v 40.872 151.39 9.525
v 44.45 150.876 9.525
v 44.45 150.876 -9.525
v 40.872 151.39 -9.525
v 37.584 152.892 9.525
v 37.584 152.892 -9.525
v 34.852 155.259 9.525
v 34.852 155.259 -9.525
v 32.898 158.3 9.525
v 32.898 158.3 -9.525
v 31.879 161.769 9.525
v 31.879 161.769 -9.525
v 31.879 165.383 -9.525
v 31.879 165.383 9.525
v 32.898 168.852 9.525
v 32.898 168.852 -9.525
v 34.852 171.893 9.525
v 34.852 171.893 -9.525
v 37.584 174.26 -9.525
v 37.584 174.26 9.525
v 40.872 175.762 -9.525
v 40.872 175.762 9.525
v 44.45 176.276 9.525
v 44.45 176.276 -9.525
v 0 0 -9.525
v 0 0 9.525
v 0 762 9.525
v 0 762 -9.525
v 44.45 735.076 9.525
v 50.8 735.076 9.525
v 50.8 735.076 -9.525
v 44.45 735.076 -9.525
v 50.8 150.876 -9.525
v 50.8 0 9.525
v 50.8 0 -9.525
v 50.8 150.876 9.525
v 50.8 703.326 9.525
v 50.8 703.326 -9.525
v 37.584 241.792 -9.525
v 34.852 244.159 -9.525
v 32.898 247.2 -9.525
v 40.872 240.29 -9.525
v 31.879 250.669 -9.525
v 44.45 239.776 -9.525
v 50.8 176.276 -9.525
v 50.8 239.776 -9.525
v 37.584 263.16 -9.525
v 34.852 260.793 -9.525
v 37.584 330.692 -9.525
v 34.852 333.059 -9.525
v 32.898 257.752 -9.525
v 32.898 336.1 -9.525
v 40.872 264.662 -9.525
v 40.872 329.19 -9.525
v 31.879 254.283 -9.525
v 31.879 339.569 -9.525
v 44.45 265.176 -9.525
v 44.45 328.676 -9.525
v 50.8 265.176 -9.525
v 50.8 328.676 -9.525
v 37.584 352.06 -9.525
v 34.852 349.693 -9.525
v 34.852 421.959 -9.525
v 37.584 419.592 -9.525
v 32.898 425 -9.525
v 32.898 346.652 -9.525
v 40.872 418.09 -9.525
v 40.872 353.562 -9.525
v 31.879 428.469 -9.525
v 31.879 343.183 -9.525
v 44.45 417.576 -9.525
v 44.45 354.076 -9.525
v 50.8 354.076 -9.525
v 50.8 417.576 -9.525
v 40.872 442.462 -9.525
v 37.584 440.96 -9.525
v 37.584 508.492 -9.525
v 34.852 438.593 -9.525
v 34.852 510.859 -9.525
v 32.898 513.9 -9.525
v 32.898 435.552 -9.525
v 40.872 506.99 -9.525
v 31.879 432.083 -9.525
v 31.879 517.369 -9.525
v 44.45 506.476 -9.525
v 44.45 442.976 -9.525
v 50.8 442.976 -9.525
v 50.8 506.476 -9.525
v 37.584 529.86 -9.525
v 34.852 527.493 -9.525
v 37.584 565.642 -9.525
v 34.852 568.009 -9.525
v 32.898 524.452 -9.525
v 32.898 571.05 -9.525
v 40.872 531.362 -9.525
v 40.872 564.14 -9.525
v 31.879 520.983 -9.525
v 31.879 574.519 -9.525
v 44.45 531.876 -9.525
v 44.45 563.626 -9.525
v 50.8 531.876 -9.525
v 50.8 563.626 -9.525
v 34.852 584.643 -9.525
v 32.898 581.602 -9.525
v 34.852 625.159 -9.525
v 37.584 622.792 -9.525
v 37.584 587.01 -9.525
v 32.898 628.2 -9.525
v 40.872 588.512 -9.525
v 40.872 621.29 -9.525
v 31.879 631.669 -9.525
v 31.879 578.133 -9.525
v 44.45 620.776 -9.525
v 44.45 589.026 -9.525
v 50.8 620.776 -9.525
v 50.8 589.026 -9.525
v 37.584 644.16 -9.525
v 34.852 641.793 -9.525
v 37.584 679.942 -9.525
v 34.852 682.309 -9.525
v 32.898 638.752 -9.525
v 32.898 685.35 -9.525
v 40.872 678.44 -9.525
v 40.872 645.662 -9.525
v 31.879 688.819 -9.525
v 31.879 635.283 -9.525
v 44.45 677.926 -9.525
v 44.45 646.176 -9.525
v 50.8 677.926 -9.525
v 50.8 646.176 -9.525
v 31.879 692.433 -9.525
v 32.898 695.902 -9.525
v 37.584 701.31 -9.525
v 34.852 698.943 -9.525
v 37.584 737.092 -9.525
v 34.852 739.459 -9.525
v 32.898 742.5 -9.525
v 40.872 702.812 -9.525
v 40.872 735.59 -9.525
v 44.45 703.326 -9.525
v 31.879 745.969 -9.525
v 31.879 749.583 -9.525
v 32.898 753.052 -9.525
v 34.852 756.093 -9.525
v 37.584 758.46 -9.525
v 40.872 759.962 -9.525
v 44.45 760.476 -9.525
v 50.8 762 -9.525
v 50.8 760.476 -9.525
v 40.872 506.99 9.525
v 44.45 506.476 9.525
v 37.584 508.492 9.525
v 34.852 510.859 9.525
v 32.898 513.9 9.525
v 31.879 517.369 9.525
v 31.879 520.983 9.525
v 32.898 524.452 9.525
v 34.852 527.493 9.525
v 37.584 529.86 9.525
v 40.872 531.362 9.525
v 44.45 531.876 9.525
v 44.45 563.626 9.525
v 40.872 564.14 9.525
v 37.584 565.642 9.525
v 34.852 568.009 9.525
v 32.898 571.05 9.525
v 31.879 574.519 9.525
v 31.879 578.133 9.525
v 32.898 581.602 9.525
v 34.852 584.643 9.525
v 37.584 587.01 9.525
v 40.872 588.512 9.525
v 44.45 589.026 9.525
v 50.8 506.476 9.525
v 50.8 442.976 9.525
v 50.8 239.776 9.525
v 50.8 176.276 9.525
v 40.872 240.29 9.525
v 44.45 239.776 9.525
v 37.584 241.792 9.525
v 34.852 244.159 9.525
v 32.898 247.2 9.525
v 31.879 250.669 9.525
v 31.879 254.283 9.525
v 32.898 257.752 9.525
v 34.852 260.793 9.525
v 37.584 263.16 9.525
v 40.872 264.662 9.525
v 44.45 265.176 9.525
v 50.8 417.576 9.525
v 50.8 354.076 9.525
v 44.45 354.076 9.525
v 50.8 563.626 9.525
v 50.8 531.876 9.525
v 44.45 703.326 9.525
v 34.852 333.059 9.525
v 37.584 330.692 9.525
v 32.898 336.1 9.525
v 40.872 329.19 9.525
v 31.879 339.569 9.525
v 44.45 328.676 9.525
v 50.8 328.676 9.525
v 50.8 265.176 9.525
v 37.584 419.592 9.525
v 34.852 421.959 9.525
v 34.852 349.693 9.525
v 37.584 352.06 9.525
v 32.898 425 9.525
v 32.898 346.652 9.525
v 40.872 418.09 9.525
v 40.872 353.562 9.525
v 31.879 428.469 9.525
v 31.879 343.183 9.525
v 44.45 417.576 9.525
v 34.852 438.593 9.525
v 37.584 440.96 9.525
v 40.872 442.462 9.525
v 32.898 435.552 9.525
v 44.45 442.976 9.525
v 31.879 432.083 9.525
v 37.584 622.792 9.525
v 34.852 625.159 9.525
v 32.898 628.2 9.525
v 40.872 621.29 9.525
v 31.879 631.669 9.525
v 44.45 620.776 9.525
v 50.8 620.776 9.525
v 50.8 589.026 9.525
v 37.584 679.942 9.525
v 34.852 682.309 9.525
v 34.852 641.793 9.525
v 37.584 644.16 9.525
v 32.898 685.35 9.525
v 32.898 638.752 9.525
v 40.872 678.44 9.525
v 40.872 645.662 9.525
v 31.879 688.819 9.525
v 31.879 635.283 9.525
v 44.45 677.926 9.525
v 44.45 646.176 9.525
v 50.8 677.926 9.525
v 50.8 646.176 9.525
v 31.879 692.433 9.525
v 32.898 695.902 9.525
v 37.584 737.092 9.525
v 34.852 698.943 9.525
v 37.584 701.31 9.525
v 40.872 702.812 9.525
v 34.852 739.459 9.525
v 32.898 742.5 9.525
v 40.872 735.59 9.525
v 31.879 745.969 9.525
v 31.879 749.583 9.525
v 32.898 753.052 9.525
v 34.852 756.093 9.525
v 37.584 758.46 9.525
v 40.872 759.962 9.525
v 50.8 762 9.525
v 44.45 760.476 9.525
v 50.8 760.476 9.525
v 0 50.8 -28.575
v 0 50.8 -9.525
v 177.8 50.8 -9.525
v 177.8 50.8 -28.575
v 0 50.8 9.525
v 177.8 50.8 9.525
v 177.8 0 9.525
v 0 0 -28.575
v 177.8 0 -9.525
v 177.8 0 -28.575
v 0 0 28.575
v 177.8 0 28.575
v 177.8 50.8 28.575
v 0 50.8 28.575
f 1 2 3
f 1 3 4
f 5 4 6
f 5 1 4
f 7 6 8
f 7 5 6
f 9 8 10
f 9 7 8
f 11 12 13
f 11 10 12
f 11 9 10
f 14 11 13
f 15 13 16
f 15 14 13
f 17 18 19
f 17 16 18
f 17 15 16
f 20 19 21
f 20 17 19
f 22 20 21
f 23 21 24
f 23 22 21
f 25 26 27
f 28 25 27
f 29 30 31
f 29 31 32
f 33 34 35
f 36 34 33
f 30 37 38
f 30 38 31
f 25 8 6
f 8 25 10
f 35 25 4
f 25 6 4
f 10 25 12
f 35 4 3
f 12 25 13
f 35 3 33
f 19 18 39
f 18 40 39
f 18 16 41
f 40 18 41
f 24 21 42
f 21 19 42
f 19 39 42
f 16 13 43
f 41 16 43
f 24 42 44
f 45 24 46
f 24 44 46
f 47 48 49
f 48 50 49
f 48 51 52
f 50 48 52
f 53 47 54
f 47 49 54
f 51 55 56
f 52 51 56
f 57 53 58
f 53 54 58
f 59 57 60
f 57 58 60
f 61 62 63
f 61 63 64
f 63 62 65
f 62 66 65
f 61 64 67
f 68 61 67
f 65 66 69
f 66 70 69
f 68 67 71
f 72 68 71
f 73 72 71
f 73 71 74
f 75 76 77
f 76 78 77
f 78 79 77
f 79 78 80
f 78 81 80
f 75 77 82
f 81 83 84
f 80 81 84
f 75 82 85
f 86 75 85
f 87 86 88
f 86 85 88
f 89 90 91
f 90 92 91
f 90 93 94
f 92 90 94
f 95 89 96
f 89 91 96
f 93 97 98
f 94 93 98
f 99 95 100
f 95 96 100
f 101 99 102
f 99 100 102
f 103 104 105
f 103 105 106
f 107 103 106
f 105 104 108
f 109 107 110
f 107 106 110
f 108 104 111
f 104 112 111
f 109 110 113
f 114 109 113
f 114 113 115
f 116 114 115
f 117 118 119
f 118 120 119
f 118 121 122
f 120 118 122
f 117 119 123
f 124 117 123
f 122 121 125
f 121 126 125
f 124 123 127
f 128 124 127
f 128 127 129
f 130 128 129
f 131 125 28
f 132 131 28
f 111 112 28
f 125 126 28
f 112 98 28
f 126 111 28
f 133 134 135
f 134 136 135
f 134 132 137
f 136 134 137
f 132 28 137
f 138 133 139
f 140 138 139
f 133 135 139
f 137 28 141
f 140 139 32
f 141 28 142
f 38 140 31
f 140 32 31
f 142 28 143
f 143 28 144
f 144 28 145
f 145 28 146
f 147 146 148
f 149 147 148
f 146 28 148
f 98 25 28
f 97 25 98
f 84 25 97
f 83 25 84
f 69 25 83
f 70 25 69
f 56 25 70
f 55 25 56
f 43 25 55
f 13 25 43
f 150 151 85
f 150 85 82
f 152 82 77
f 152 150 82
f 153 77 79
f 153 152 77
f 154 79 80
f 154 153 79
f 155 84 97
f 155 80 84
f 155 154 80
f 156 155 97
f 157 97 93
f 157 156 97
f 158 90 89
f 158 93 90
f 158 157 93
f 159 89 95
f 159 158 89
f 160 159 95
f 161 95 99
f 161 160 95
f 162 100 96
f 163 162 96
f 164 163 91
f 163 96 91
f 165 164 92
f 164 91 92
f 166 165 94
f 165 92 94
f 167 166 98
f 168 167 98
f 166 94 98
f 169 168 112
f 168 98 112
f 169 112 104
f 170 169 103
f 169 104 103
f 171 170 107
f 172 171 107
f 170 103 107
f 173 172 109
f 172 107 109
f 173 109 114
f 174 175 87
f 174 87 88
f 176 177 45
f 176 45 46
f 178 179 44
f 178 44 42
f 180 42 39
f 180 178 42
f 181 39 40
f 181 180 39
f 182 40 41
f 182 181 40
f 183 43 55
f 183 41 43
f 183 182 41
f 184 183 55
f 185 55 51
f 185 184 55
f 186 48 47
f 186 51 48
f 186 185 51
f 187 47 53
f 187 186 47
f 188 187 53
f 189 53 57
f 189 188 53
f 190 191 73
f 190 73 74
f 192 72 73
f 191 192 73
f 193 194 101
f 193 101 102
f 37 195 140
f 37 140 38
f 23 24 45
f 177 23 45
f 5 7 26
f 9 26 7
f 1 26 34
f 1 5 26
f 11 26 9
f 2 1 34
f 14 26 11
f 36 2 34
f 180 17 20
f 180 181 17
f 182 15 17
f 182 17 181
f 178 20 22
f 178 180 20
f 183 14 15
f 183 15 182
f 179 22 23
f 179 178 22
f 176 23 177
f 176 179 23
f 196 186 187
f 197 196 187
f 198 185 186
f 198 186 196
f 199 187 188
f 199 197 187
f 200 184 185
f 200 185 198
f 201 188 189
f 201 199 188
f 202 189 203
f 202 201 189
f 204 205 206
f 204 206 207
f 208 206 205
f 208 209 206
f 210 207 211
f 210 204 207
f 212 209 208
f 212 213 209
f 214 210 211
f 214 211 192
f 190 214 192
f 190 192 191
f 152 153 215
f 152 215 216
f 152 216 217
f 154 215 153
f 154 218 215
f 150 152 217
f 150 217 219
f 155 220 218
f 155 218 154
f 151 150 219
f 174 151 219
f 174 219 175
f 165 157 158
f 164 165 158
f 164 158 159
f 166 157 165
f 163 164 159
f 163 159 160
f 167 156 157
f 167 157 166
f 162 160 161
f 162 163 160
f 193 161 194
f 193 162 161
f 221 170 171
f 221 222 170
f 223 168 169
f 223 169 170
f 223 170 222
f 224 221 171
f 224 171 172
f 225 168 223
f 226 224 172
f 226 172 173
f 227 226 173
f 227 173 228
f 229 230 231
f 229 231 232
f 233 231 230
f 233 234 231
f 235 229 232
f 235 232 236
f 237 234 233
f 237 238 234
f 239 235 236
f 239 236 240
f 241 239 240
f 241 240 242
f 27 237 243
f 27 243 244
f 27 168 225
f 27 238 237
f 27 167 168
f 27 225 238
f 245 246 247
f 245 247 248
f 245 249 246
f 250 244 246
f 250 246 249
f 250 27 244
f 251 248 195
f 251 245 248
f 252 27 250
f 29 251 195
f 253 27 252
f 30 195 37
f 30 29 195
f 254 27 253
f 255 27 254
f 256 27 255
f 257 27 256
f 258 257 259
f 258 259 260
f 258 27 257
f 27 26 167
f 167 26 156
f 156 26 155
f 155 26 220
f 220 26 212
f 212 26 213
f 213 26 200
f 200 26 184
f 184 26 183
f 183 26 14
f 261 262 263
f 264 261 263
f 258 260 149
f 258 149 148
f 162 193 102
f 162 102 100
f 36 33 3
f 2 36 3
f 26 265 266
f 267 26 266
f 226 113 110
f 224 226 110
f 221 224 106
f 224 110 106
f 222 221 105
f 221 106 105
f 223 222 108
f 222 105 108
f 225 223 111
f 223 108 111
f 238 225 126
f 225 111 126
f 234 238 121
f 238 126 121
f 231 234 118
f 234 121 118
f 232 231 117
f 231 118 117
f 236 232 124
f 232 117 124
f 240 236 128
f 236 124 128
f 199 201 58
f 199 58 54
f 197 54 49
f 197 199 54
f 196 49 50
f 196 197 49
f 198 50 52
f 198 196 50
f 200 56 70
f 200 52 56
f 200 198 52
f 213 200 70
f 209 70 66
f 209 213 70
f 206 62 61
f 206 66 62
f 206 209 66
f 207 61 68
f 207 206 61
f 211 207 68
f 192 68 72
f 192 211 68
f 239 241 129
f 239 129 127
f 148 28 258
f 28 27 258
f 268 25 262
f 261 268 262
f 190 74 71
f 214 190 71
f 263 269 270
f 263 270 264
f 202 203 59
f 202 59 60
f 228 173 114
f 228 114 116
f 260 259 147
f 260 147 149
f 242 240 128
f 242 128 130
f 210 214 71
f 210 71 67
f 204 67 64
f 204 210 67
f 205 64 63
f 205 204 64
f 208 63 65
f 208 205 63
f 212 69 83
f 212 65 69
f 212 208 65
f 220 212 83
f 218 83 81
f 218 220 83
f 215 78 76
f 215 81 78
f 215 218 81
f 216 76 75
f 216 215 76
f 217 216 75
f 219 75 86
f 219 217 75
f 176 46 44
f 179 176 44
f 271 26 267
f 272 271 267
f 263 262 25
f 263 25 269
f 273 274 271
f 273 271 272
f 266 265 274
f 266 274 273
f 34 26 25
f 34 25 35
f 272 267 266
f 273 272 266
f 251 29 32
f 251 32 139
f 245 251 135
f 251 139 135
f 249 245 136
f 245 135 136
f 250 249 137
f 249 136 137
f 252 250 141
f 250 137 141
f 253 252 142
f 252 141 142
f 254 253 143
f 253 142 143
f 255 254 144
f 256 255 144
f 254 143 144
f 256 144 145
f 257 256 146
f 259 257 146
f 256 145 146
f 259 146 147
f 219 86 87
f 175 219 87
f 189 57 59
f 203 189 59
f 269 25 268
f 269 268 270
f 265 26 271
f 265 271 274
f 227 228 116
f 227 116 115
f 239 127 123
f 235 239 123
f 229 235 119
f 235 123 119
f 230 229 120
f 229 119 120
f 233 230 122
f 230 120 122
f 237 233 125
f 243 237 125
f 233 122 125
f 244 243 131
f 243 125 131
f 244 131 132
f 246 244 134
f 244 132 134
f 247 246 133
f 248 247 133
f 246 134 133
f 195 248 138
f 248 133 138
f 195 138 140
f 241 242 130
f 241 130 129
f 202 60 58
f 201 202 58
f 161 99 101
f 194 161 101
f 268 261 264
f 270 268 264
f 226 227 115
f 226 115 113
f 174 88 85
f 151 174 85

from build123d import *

# Parameters (mm, degrees)
SKETCH1_W           = 50.8
SKETCH1_H           = 762
BOSS_EXTRUDE1_DEPTH = 9.525
SKETCH3_W           = 177.8
SKETCH3_H           = 50.8
BOSS_EXTRUDE2_DEPTH = 19.05
CUT_EXTRUDE1_DEPTH  = 784.395462075
LPATTERN6_COUNT     = 5
LPATTERN6_PITCH     = 88.9
CUT_EXTRUDE3_DEPTH  = 784.395462075


with BuildPart() as part:
    # Sketch1 → Boss-Extrude1 (new, symmetric)
    with BuildSketch(Plane.XY):
        with Locations((25.4, 381)):
            Rectangle(SKETCH1_W, SKETCH1_H)
    extrude(amount=BOSS_EXTRUDE1_DEPTH, both=True)

    # Sketch2 → Cut-Extrude1 (cut, through all)
    with BuildSketch(Plane.XY.offset(9.525)):
        with BuildLine():
            Line((44.45, 176.276), (50.8, 176.276))
            Line((50.8, 176.276), (50.8, 150.876))
            Line((50.8, 150.876), (44.45, 150.876))
            ThreePointArc((44.45, 150.876), (31.75, 163.576), (44.45, 176.276))
        make_face()
    cut_extrude1 = extrude(amount=-CUT_EXTRUDE1_DEPTH, mode=Mode.SUBTRACT)

    # LPattern6: Cut-Extrude1 ×5
    with Locations(*[(0, i * LPATTERN6_PITCH, 0) for i in range(1, LPATTERN6_COUNT)]):
        add(cut_extrude1, mode=Mode.SUBTRACT)

    # Sketch5 → Cut-Extrude3 (cut, through all)
    with BuildSketch(Plane(origin=(0, 0, -9.525), x_dir=(-1, 0, 0), z_dir=(0, 0, -1))):
        with BuildLine():
            Line((-44.45, 531.876), (-50.8, 531.876))
            Line((-50.8, 531.876), (-50.8, 506.476))
            Line((-50.8, 506.476), (-44.45, 506.476))
            ThreePointArc((-44.45, 506.476), (-31.75, 519.176), (-44.45, 531.876))
        make_face()
        with BuildLine():
            Line((-50.8, 589.026), (-50.8, 563.626))
            Line((-50.8, 563.626), (-44.45, 563.626))
            ThreePointArc((-44.45, 563.626), (-31.75, 576.326), (-44.45, 589.026))
            Line((-44.45, 589.026), (-50.8, 589.026))
        make_face()
        with BuildLine():
            Line((-50.8, 646.176), (-50.8, 620.776))
            Line((-50.8, 620.776), (-44.45, 620.776))
            ThreePointArc((-44.45, 620.776), (-31.75, 633.476), (-44.45, 646.176))
            Line((-44.45, 646.176), (-50.8, 646.176))
        make_face()
        with BuildLine():
            Line((-50.8, 703.326), (-50.8, 677.926))
            Line((-50.8, 677.926), (-44.45, 677.926))
            ThreePointArc((-44.45, 677.926), (-31.75, 690.626), (-44.45, 703.326))
            Line((-44.45, 703.326), (-50.8, 703.326))
        make_face()
        with BuildLine():
            Line((-50.8, 760.476), (-50.8, 735.076))
            Line((-50.8, 735.076), (-44.45, 735.076))
            ThreePointArc((-44.45, 735.076), (-31.75, 747.776), (-44.45, 760.476))
            Line((-44.45, 760.476), (-50.8, 760.476))
        make_face()
    extrude(amount=-CUT_EXTRUDE3_DEPTH, mode=Mode.SUBTRACT)


with BuildPart() as body_2:
    # Sketch3 → Boss-Extrude2 (new body)
    with BuildSketch(Plane.XY.offset(9.525)):
        with Locations((88.9, 25.4)):
            Rectangle(SKETCH3_W, SKETCH3_H)
    extrude(amount=BOSS_EXTRUDE2_DEPTH)


with BuildPart() as body_3:
    # Mirror1: mirrored copy
    add(body_2.part.mirror(Plane.XY))


solid = Compound([part.part, body_2.part, body_3.part])
